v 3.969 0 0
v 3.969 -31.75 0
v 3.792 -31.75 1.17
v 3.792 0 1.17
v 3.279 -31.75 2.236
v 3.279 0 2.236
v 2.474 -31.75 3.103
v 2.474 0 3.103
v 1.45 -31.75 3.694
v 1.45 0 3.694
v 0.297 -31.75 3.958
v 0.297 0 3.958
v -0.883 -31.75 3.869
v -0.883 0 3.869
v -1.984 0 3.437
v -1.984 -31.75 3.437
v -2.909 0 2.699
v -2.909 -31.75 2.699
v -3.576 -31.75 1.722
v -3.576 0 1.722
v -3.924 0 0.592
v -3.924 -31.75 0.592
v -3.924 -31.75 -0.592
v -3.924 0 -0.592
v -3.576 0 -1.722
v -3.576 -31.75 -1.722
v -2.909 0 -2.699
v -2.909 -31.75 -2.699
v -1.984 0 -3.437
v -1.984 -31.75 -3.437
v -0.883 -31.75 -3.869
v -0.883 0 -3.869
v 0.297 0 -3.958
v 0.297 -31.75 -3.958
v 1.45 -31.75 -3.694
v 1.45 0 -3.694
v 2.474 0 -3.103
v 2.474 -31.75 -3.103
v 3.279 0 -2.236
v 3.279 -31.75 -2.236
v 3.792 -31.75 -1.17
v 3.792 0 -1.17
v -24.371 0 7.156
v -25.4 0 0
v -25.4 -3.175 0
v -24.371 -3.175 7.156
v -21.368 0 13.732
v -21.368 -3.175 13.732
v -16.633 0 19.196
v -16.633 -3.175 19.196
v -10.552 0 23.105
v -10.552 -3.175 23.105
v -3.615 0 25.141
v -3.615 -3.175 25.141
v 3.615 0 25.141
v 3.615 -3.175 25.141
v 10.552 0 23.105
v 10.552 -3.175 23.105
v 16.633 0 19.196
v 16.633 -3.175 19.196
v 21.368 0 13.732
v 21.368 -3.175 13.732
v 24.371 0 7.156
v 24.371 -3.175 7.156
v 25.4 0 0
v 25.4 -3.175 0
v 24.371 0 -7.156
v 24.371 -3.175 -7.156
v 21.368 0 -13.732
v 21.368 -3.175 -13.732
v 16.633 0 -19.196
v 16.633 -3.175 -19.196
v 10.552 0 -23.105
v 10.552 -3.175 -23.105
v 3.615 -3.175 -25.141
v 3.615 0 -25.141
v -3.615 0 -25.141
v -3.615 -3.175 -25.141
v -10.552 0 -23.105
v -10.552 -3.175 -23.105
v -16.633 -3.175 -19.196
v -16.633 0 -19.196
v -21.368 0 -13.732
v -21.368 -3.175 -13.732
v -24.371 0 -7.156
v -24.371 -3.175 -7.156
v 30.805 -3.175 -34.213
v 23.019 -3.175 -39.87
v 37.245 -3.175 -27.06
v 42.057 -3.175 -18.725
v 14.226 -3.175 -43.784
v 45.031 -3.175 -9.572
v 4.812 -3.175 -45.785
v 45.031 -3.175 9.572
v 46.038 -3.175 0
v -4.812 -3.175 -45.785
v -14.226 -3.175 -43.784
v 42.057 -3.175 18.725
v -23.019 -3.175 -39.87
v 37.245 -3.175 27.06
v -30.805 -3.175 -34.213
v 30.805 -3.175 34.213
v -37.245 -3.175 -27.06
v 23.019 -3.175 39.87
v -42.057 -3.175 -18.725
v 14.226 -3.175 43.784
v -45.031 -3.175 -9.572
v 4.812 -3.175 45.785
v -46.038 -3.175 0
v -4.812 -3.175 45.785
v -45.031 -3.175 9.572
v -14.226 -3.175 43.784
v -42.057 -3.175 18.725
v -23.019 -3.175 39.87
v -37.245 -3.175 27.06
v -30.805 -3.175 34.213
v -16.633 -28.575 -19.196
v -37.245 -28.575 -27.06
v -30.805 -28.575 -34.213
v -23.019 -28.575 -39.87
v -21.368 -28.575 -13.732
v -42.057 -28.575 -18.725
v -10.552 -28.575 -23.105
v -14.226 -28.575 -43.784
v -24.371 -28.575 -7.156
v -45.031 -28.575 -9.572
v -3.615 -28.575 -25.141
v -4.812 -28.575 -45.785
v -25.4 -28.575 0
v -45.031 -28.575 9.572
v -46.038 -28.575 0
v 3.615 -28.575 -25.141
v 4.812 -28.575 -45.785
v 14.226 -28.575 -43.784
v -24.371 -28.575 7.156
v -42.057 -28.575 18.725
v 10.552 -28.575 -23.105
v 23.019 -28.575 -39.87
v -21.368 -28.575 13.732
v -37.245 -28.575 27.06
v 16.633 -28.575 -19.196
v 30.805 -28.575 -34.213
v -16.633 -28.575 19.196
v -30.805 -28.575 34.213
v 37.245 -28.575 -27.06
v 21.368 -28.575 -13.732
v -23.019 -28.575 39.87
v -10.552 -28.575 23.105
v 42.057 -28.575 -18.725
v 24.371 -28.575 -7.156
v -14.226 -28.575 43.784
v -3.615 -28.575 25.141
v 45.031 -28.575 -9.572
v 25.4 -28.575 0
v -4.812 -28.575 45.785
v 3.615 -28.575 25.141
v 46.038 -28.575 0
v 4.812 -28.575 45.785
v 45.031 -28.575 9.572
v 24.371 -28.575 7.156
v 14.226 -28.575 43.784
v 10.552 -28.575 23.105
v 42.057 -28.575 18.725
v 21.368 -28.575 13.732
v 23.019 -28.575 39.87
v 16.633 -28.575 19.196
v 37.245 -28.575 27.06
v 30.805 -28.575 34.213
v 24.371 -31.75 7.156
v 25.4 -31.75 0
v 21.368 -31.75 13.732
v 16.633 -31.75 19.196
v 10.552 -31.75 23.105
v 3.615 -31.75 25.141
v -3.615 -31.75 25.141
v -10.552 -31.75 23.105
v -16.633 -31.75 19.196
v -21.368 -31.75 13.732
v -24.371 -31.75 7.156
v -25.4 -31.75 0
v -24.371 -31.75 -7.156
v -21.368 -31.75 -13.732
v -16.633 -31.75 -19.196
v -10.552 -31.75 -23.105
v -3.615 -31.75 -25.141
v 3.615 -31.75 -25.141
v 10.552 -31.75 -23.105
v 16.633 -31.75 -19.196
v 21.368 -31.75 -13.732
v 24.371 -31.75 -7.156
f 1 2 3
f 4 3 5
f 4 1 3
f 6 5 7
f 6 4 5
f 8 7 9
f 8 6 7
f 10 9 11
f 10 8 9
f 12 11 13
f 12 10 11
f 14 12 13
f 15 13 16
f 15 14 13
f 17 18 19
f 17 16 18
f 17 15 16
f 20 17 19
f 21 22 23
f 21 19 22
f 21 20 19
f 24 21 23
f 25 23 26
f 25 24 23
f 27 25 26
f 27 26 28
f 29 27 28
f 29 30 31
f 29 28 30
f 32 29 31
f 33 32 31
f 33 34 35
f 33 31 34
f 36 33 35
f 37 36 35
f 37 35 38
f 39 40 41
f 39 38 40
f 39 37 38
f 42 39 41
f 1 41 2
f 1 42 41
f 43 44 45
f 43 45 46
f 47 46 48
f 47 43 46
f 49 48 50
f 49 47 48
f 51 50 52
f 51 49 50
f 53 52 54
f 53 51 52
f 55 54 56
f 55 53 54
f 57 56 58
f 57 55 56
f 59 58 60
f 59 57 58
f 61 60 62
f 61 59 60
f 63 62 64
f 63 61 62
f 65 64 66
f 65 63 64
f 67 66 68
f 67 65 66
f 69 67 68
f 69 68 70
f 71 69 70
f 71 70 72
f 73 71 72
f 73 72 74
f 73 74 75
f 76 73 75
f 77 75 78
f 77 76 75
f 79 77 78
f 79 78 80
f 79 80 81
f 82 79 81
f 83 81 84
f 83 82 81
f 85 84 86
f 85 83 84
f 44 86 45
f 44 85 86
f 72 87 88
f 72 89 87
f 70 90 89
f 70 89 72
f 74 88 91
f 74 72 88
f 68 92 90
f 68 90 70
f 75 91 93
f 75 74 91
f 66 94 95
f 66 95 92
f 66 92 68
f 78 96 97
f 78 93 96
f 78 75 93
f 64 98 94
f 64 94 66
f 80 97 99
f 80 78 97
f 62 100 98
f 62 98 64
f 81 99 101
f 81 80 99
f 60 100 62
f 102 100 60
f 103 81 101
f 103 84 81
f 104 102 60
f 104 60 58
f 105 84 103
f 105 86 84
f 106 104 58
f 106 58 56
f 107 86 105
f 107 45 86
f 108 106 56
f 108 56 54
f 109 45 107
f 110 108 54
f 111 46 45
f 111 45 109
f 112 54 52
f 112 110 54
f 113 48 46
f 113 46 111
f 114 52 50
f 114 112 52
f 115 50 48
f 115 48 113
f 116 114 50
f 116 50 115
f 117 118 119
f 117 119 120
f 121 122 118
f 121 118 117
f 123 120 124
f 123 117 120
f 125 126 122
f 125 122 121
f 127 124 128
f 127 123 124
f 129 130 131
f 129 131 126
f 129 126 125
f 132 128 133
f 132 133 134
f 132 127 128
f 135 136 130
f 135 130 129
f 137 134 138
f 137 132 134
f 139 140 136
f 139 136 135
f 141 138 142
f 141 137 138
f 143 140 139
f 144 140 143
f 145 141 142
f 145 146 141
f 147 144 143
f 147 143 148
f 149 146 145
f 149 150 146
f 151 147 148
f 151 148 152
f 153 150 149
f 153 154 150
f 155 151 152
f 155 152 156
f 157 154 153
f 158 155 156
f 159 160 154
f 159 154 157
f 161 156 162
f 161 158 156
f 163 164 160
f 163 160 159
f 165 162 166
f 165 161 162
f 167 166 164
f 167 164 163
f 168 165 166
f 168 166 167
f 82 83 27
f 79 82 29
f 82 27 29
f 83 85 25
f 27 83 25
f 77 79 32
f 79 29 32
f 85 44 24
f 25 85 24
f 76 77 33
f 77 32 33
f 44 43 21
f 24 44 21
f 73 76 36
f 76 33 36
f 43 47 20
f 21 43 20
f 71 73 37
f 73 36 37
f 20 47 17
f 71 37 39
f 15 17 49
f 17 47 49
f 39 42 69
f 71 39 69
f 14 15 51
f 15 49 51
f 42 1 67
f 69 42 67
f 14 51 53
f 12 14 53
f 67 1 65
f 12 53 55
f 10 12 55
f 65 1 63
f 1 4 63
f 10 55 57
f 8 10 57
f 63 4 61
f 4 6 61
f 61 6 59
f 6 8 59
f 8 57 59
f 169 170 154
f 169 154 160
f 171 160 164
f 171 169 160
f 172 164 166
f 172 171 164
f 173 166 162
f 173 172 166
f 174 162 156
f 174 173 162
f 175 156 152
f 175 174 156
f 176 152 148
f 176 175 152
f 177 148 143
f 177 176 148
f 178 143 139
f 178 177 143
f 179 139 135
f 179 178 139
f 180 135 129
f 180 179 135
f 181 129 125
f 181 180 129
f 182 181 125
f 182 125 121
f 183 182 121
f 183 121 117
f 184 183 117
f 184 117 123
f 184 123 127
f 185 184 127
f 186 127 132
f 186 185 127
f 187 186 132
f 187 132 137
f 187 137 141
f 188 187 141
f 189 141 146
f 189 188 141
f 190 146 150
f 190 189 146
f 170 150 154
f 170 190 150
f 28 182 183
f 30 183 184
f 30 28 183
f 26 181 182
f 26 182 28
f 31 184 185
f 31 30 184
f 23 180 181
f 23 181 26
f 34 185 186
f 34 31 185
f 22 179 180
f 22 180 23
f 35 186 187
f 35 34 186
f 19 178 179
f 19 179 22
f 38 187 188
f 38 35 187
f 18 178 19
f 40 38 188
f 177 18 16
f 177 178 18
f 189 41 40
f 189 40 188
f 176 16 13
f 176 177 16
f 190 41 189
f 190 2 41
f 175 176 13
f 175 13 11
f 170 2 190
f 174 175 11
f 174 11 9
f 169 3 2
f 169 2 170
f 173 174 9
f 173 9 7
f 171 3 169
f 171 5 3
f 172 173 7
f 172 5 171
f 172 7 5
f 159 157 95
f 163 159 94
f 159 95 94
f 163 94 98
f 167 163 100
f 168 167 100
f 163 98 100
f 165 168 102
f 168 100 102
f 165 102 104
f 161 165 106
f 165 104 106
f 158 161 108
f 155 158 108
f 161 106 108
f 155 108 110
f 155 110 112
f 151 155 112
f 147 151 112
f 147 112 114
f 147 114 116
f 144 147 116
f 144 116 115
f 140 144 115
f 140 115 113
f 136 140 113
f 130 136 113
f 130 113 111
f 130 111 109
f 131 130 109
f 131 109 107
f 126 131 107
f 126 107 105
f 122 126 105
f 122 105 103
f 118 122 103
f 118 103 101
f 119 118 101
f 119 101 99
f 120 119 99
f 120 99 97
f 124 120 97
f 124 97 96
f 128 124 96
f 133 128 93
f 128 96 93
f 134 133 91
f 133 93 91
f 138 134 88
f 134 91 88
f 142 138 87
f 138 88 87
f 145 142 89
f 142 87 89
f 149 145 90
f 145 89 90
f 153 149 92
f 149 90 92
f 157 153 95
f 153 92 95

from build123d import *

# Parameters (mm, degrees)
F0_R     = 46.0375
F1_DEPTH = 31.75
F2_R     = 46.0375
F2_R_2   = 25.4
F3_DEPTH = 3.175
F4_R     = 46.0375
F4_R_2   = 25.4
F5_DEPTH = 3.175
F6_R     = 3.96875
F7_DEPTH = 31.751


with BuildPart() as f1:
    # F0 (on Front) → F1 (new body)
    with BuildSketch(Plane.XZ):
        Circle(F0_R)
    extrude(amount=F1_DEPTH)

    # F2 (on face) → F3 (cut)
    with BuildSketch(Plane.XZ.offset(31.75)):
        Circle(F2_R)
        Circle(F2_R_2, mode=Mode.SUBTRACT)
    extrude(amount=-F3_DEPTH, mode=Mode.SUBTRACT)

    # F4 (on face) → F5 (cut)
    with BuildSketch(Plane(origin=(0, 0, 0), x_dir=(-1, 0, 0), z_dir=(0, 1, 0))):
        Circle(F4_R)
        Circle(F4_R_2, mode=Mode.SUBTRACT)
    extrude(amount=-F5_DEPTH, mode=Mode.SUBTRACT)

    # F6 (on Front) → F7 (cut, through all)
    with BuildSketch(Plane.XZ):
        Circle(F6_R)
    extrude(amount=F7_DEPTH, mode=Mode.SUBTRACT)


solid = f1.part
